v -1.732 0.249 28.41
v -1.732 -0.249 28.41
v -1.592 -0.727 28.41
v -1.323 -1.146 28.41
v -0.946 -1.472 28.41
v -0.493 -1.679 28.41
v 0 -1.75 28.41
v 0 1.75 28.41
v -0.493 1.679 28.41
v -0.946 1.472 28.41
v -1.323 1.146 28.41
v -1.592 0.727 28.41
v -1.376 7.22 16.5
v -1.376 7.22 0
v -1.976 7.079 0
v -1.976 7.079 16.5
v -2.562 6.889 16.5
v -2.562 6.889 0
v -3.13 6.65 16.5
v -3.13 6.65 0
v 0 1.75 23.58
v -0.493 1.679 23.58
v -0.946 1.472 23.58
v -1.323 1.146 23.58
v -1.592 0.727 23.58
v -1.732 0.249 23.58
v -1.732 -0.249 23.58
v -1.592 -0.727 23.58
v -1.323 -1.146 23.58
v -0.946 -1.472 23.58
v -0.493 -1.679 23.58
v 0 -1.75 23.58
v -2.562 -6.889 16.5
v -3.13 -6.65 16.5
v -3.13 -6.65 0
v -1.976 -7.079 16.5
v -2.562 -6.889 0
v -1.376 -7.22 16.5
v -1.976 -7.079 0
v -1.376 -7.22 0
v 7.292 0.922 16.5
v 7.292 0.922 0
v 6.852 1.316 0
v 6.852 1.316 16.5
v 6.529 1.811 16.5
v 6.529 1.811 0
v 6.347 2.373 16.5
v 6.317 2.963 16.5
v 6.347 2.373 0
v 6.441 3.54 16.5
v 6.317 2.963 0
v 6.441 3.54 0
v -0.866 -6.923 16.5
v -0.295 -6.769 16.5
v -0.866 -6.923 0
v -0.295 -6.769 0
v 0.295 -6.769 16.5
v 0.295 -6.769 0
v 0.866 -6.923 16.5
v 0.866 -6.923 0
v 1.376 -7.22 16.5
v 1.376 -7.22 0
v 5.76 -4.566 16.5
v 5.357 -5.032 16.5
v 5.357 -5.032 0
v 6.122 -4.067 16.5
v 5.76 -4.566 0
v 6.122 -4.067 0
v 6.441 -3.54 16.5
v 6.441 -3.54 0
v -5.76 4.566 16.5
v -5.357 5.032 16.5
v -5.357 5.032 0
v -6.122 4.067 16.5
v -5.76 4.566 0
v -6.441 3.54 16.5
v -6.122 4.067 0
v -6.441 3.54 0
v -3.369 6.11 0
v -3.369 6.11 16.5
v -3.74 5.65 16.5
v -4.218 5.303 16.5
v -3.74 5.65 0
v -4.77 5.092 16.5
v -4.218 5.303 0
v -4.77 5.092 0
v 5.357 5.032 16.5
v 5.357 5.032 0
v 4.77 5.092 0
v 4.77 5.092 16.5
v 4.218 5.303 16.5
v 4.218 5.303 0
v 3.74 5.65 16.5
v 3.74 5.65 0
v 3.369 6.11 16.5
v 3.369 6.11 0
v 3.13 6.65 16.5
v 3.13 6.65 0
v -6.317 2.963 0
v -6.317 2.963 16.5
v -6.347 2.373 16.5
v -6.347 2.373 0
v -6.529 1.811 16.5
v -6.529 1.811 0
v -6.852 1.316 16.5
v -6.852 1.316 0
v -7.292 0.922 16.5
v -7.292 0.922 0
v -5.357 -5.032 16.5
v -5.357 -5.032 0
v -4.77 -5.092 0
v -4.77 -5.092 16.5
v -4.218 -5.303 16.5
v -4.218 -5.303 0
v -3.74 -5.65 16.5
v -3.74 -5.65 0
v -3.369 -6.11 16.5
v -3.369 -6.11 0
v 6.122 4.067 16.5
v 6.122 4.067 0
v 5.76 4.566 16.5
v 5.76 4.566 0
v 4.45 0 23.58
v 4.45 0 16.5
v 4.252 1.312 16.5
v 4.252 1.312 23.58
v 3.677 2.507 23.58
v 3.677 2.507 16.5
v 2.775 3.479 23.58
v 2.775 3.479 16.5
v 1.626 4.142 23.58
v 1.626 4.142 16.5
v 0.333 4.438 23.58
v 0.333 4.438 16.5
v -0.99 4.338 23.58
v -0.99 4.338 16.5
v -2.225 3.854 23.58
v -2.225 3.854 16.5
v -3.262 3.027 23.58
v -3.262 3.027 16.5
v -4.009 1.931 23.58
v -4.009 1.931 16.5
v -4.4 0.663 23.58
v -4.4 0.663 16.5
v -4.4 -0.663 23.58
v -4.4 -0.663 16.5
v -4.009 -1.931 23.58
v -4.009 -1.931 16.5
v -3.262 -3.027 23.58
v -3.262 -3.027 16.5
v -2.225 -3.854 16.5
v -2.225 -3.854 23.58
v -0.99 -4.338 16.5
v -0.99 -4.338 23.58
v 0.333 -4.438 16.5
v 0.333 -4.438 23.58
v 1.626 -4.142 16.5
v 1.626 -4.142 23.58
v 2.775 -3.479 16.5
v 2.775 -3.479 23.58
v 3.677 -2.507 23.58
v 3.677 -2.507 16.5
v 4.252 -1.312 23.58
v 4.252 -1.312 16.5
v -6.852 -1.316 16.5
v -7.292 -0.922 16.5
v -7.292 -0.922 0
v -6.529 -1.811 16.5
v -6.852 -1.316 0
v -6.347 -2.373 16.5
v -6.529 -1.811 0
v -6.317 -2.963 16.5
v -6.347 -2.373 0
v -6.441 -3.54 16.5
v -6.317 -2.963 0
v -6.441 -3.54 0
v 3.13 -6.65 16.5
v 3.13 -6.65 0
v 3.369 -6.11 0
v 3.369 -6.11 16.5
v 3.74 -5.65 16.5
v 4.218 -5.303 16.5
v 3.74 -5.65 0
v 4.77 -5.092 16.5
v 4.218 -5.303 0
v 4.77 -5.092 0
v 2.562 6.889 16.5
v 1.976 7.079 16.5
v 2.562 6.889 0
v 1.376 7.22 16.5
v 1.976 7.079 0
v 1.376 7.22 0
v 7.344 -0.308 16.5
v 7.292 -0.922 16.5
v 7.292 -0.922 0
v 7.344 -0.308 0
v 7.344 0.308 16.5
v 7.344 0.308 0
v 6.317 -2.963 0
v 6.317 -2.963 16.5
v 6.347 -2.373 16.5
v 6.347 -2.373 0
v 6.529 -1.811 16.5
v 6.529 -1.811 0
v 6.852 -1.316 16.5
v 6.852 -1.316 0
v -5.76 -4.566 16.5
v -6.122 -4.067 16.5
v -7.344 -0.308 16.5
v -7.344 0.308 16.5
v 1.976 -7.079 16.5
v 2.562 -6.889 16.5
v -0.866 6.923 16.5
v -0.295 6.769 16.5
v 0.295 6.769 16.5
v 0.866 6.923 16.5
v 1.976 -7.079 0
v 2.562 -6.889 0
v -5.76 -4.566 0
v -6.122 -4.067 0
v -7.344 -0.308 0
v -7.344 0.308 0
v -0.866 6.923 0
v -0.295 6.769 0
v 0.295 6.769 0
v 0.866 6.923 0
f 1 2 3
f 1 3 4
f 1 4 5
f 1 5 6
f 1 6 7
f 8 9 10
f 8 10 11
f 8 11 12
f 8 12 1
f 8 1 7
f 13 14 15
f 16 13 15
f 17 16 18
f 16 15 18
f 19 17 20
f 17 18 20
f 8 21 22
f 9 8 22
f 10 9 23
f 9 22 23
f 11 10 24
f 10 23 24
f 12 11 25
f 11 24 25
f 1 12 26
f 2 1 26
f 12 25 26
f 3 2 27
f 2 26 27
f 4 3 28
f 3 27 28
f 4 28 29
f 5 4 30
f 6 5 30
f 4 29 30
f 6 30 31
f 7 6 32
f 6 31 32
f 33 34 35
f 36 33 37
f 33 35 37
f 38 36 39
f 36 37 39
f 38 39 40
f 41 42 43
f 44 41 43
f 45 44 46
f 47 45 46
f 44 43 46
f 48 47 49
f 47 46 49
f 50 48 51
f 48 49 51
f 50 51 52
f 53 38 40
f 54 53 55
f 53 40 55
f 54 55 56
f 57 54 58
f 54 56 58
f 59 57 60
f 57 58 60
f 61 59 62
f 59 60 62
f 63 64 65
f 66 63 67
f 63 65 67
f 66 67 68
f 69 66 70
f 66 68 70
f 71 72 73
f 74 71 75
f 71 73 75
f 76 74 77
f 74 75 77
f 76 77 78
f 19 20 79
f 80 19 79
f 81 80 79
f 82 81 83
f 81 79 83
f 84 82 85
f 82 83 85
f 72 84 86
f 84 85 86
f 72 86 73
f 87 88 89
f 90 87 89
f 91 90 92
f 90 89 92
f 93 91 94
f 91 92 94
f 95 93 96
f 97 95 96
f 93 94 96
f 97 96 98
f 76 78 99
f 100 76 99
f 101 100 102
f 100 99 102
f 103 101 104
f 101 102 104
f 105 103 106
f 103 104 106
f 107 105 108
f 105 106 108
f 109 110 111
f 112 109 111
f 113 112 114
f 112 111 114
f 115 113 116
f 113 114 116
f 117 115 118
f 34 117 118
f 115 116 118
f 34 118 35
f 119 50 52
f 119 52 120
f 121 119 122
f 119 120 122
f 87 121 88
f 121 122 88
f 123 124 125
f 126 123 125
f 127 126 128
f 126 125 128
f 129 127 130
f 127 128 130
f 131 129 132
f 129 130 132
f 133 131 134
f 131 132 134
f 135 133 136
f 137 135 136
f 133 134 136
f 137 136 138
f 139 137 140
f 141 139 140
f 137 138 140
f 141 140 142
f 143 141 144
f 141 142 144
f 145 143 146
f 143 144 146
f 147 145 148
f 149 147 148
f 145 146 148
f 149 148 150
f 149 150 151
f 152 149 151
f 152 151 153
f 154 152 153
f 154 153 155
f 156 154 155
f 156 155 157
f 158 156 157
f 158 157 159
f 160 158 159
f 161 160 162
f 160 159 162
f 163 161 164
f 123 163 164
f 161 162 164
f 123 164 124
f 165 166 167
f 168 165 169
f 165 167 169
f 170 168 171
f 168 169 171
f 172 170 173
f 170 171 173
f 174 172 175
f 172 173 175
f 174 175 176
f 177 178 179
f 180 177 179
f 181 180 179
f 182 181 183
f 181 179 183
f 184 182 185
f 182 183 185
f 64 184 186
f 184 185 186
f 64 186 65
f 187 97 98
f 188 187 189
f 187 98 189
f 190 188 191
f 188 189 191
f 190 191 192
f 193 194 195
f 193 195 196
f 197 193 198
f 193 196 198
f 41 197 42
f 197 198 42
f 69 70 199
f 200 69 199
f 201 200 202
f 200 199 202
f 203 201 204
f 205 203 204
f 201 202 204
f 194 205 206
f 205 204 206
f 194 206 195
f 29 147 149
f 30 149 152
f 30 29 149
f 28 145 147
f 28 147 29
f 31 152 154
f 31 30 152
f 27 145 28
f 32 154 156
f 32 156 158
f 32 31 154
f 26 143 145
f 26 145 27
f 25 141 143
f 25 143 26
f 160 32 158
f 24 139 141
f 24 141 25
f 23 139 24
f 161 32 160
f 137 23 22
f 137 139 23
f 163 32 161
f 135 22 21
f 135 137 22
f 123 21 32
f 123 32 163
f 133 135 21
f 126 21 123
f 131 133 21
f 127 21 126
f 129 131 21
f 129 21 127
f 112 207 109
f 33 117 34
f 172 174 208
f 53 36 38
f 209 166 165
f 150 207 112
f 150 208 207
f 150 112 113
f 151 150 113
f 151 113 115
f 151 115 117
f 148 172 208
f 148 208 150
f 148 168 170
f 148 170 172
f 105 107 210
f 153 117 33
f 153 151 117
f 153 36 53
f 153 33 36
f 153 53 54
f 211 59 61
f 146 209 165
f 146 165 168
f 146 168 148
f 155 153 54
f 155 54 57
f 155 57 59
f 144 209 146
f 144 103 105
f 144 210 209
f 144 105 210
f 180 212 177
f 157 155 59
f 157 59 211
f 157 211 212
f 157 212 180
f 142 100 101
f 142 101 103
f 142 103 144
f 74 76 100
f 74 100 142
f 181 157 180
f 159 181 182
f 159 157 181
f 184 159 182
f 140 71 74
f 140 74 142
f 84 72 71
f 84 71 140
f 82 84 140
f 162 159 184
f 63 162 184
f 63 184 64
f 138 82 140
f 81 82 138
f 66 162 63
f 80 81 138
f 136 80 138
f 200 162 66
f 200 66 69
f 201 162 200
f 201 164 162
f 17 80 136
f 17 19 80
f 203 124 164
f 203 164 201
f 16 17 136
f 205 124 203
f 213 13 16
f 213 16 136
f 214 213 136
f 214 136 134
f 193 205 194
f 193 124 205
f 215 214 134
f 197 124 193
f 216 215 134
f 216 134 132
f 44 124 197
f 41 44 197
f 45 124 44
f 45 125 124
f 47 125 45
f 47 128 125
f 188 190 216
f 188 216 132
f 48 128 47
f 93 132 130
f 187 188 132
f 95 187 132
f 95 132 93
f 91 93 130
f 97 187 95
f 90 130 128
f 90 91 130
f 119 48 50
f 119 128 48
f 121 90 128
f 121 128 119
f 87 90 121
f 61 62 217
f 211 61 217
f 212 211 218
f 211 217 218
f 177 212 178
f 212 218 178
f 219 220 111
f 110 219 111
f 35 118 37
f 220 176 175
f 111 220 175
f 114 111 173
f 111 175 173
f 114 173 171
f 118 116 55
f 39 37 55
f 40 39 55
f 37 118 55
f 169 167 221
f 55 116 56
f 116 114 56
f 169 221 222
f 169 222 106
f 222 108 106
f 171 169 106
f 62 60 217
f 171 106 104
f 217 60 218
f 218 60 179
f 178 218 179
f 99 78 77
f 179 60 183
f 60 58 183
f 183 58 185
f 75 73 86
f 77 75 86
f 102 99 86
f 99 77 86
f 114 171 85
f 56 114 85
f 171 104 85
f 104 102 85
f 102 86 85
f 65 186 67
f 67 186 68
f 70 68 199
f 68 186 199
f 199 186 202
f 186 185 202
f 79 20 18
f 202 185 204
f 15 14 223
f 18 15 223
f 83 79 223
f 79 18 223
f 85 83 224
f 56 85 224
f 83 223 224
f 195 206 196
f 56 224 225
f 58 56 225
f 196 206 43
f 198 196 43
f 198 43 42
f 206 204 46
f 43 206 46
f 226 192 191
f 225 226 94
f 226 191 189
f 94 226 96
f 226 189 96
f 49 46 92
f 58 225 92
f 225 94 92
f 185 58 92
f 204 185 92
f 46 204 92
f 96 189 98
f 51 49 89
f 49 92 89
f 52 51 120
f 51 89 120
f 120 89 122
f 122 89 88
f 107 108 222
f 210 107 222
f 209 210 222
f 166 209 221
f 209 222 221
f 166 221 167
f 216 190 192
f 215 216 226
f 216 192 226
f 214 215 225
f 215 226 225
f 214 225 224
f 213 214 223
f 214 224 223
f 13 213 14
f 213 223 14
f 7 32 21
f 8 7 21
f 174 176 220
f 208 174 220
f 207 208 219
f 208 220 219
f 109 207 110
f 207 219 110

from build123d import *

# Parameters (mm, degrees)
F0_R     = 7.35
F1_DEPTH = 16.5
F2_R     = 4.45
F3_DEPTH = 7.08
F6_DEPTH = 4.83
F7_R     = 2.25
F8_DEPTH = 25
F9_DEPTH = 25


with BuildPart() as f1:
    # F0 (on Top) → F1 (new body)
    with BuildSketch(Plane.XY):
        Circle(F0_R)
    extrude(amount=F1_DEPTH)

    # F2 (on face) → F3 (join)
    with BuildSketch(Plane.XY.offset(16.5)):
        Circle(F2_R)
    extrude(amount=F3_DEPTH)

    # F5 (on face) → F6 (join)
    with BuildSketch(Plane.XY.offset(23.58)):
        with BuildLine():
            Line((0, -1.75), (0, 1.75))
            ThreePointArc((0, 1.75), (-1.75, 0), (0, -1.75))
        make_face()
    extrude(amount=F6_DEPTH)

    # F7 (on face) → F8 (cut)
    with BuildSketch(Plane(origin=(0, 0, 0), x_dir=(1, 0, 0), z_dir=(0, 0, -1))):
        with Locations((0, -9)):
            Circle(F7_R)
        with Locations((5.2900672706, -7.2811529494)):
            Circle(F7_R)
        with Locations((8.5595086467, -2.7811529494)):
            Circle(F7_R)
        with Locations((8.5595086467, 2.7811529494)):
            Circle(F7_R)
        with Locations((5.2900672706, 7.2811529494)):
            Circle(F7_R)
        with Locations((0, 9)):
            Circle(F7_R)
        with Locations((-5.2900672706, 7.2811529494)):
            Circle(F7_R)
        with Locations((-8.5595086467, 2.7811529494)):
            Circle(F7_R)
        with Locations((-8.5595086467, -2.7811529494)):
            Circle(F7_R)
        with Locations((-5.2900672706, -7.2811529494)):
            Circle(F7_R)
    extrude(amount=-F8_DEPTH, mode=Mode.SUBTRACT)

    # F7 (on face) → F9 (cut)
    with BuildSketch(Plane(origin=(0, 0, 0), x_dir=(1, 0, 0), z_dir=(0, 0, -1))):
        with BuildLine():
            ThreePointArc((7.2919167208, -0.9221987516), (6.419631485, -2.085864712), (6.4413393745, -3.5400066472))
            ThreePointArc((6.4413393745, -3.5400066472), (6.9902653948, -2.2712749087), (7.2919167208, -0.9221987516))
        make_face()
        with BuildLine():
            ThreePointArc((5.3572297228, -5.0321555716), (4.3202216043, -5.9462749087), (3.1303893203, -6.6500498271))
            ThreePointArc((3.1303893203, -6.6500498271), (4.9713004187, -9.5084579788), (7.5400672706, -7.2811529494))
            ThreePointArc((7.5400672706, -7.2811529494), (6.9046284366, -5.7140881003), (5.3572297228, -5.0321555716))
        make_face()
        with BuildLine():
            ThreePointArc((-1.3762630563, -7.22), (-0.9914403975, -11.0197885875), (2.25, -9))
            ThreePointArc((2.25, -9), (2.0197885875, -8.0085596025), (1.3762630563, -7.22))
            ThreePointArc((1.3762630563, -7.22), (0, -7.35), (-1.3762630563, -7.22))
        make_face()
        with BuildLine():
            ThreePointArc((-3.0400672706, -7.2811529494), (-3.0627622412, -6.9623860974), (-3.1303893203, -6.6500498271))
            ThreePointArc((-3.1303893203, -6.6500498271), (-4.3202216043, -5.9462749087), (-5.3572297228, -5.0321555716))
            ThreePointArc((-5.3572297228, -5.0321555716), (-6.8571321197, -8.8957141153), (-3.0400672706, -7.2811529494))
        make_face()
        with BuildLine():
            ThreePointArc((-7.2919167208, -0.9221987516), (-10.6993858083, -3.4764411867), (-6.4413393745, -3.5400066472))
            ThreePointArc((-6.4413393745, -3.5400066472), (-6.9902653948, -2.2712749087), (-7.2919167208, -0.9221987516))
        make_face()
        with BuildLine():
            ThreePointArc((-6.4413393745, 3.5400066472), (-10.6993858083, 3.4764411867), (-7.2919167208, 0.9221987516))
            ThreePointArc((-7.2919167208, 0.9221987516), (-6.9902653948, 2.2712749087), (-6.4413393745, 3.5400066472))
        make_face()
        with BuildLine():
            ThreePointArc((-3.1303893203, 6.6500498271), (-4.3202216043, 5.9462749087), (-5.3572297228, 5.0321555716))
            ThreePointArc((-5.3572297228, 5.0321555716), (-3.967550453, 5.460864712), (-3.1303893203, 6.6500498271))
        make_face()
        with BuildLine():
            ThreePointArc((1.3762630563, 7.22), (0, 7.35), (-1.3762630563, 7.22))
            ThreePointArc((-1.3762630563, 7.22), (0, 6.75), (1.3762630563, 7.22))
        make_face()
        with BuildLine():
            ThreePointArc((3.1303893203, 6.6500498271), (3.967550453, 5.460864712), (5.3572297228, 5.0321555716))
            ThreePointArc((5.3572297228, 5.0321555716), (4.3202216043, 5.9462749087), (3.1303893203, 6.6500498271))
        make_face()
        with BuildLine():
            ThreePointArc((6.4413393745, 3.5400066472), (6.419631485, 2.085864712), (7.2919167208, 0.9221987516))
            ThreePointArc((7.2919167208, 0.9221987516), (6.9902653948, 2.2712749087), (6.4413393745, 3.5400066472))
        make_face()
    extrude(amount=-F9_DEPTH, mode=Mode.SUBTRACT)


solid = f1.part
